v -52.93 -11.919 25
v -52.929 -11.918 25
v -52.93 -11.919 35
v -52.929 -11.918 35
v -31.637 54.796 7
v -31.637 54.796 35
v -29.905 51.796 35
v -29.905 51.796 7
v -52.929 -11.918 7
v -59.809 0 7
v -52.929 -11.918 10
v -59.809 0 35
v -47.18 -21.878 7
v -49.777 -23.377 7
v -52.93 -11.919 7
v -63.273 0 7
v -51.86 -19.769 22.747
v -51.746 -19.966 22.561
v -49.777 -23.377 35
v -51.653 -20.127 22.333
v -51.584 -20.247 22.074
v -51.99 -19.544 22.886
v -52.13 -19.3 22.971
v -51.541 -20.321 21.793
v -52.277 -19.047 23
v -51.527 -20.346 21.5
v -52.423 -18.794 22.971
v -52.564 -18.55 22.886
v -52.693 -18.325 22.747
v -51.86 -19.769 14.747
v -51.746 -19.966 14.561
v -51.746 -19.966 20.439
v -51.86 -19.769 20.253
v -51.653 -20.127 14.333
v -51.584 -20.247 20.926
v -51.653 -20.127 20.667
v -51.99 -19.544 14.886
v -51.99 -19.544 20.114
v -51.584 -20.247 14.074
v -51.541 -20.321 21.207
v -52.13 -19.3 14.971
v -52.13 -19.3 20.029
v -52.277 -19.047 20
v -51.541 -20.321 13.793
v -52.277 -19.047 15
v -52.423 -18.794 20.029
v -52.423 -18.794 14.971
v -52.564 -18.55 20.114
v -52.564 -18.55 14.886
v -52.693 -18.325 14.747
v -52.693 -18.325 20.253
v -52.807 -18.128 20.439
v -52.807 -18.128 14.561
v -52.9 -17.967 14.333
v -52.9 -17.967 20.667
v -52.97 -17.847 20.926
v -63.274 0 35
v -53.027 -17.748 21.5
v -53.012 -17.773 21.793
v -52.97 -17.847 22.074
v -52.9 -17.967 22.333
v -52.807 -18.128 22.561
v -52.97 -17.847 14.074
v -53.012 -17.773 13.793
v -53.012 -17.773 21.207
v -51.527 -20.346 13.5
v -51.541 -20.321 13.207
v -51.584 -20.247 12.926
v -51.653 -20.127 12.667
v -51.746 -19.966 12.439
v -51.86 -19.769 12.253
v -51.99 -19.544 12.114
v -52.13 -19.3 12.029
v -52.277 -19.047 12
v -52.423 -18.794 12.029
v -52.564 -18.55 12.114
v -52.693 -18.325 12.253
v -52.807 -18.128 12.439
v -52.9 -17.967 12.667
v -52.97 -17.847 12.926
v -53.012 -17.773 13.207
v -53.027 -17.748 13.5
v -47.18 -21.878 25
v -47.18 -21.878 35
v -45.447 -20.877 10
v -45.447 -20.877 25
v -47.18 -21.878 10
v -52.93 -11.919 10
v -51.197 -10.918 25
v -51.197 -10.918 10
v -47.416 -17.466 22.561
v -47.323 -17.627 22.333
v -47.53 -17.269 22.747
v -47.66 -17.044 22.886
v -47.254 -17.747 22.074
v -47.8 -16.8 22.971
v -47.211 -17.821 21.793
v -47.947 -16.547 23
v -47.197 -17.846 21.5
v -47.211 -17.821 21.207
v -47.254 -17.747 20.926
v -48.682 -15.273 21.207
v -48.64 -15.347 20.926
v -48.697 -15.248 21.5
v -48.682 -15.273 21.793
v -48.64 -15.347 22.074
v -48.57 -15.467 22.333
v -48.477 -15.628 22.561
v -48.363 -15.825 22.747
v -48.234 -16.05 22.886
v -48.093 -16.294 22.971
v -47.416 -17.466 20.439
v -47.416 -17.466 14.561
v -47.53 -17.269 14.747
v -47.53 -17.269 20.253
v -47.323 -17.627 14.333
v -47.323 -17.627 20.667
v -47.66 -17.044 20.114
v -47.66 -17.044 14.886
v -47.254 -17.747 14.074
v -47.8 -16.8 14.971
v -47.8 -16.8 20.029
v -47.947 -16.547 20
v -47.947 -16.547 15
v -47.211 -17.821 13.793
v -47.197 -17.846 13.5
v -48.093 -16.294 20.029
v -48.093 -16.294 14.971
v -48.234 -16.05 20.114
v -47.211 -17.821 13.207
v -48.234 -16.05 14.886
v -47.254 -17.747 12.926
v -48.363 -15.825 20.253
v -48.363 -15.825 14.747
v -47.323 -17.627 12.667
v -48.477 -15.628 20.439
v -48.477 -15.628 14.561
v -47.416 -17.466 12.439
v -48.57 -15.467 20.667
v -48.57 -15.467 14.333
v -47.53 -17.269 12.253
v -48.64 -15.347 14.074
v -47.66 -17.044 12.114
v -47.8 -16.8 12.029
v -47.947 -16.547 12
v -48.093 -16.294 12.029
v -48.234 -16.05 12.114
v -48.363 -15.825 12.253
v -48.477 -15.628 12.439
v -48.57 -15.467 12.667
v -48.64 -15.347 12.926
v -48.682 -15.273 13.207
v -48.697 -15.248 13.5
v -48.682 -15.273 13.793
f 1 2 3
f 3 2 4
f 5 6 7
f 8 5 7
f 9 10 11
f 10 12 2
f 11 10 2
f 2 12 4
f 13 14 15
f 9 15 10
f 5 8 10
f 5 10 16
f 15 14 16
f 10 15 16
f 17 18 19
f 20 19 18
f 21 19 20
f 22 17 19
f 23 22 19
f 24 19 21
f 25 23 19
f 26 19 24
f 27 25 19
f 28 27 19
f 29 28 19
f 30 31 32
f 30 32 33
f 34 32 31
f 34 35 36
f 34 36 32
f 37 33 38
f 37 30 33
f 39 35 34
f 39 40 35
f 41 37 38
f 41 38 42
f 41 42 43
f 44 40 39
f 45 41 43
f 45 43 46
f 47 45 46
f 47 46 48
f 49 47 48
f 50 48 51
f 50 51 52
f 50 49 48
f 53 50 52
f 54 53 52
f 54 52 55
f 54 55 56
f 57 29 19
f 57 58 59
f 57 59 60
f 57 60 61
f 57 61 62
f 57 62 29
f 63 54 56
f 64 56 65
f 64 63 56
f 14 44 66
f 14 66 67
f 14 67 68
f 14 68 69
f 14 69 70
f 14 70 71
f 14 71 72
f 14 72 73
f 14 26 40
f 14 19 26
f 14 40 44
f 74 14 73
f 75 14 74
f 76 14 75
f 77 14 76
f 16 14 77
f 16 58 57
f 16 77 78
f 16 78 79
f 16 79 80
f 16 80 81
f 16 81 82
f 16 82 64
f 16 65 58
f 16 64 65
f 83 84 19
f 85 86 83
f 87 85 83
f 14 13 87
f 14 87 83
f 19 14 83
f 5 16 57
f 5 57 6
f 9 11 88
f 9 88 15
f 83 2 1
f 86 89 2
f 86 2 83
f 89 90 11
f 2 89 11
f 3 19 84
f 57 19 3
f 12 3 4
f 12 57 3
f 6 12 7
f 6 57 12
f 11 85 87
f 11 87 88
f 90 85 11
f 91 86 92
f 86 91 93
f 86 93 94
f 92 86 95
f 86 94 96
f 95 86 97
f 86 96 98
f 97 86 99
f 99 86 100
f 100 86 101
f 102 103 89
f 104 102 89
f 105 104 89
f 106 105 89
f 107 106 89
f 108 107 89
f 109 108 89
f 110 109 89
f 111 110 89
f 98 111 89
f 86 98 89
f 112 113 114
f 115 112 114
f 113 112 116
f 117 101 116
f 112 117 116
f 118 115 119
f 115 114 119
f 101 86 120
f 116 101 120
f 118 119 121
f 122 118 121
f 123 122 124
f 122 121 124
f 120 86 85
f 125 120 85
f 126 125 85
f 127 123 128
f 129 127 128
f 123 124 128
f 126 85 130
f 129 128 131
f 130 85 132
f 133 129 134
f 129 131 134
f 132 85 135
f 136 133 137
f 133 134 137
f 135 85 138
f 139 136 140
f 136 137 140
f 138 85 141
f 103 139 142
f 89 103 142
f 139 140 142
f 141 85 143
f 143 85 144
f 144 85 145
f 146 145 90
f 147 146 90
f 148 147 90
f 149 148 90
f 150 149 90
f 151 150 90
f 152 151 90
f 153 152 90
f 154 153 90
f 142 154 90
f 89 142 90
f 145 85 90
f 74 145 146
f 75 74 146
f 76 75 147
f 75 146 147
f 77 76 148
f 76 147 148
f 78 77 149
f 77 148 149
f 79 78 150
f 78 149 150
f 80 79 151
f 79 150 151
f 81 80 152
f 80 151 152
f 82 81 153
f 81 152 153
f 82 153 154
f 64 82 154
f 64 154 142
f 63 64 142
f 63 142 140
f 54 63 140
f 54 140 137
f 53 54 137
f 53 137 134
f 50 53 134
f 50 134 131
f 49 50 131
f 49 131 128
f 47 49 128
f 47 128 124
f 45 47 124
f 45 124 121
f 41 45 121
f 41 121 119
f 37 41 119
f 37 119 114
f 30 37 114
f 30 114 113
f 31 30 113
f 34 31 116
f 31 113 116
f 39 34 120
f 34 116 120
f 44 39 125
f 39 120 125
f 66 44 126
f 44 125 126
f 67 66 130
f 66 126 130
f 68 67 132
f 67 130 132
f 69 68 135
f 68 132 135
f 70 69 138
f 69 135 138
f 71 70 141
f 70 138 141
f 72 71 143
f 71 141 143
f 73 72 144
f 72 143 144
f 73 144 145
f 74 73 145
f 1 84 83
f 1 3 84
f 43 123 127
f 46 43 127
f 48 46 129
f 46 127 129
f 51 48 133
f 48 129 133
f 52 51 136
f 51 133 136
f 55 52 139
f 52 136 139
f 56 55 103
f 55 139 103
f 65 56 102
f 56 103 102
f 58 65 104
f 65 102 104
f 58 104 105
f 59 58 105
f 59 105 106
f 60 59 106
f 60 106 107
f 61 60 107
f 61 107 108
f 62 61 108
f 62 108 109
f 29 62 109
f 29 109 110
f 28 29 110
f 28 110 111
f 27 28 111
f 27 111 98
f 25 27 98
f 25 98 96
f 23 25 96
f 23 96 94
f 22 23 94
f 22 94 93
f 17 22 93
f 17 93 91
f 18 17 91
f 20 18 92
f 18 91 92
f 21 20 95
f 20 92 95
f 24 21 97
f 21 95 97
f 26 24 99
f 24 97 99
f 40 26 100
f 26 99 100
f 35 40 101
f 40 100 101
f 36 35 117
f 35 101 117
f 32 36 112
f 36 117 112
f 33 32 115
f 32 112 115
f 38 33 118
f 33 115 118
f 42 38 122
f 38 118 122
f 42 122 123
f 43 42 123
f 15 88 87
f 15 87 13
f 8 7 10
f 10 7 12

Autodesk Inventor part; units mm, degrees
ref_plane "YZ Plane" through (0, 0, 0) normal (1, 0, 0) x (0, 1, 0)
ref_plane "XZ Plane" through (0, 0, 0) normal (0, 1, 0) x (-1, 0, 0)
ref_plane "XY Plane" through (0, 0, 0) normal (0, 0, 1) x (1, 0, 0)
sketch "Sketch1" plane through (0, 0, 0) normal (0, 0, 1) x (1, 0, 0)
  line L0 (57.5, 0) -> (28.75, -49.7965) construction
  line L1 (28.75, -49.7965) -> (-28.75, -49.7965) construction
  line L2 (-28.75, -49.7965) -> (-57.5, 0) construction
  line L3 (-57.5, 0) -> (-28.75, 49.7965) construction
  line L4 (-28.75, 49.7965) -> (28.75, 49.7965) construction
  line L5 (28.75, 49.7965) -> (57.5, 0) construction
  line L6 (-31.6368, 54.7965) -> (-63.2735, 0) construction
  line L7 (-63.2735, 0) -> (-31.6368, -54.7965) construction
  line L8 (-31.6368, -54.7965) -> (31.6368, -54.7965) construction
  line L9 (31.6368, -54.7965) -> (63.2735, 0) construction
  line L10 (63.2735, 0) -> (31.6368, 54.7965) construction
  line L11 (31.6368, 54.7965) -> (-31.6368, 54.7965) construction
  line L12 (-47.9466, -16.547) -> (-52.2767, -19.047) construction
  line L13 (-45.4466, -20.8771) -> (-49.7767, -23.3771)
  line L14 (-45.4466, -20.8771) -> (-57.5, 0)
  line L15 (-49.7767, -23.3771) -> (-63.2735, 0)
  line L16 (-63.2735, 0) -> (-31.6368, 54.7965)
  line L17 (-31.6368, 54.7965) -> (-28.75, 49.7965)
  line L18 (-28.75, 49.7965) -> (-57.5, 0)
  point P0 (0, 0)
  point P1 (0, 0)
  dimension "d0" = 115
  dimension "d1" = 5
  dimension "d2" = 19.1068
  dimension "d3" = 5
extrude "Extrusion1" add sketch "Sketch1" along normal blind 35
sketch "Sketch2" plane through (-57.5, 0, 35) normal (0.8660254, 0.5, 0) x (0, 0, -1)
  circle A0 centre (17.5, -19.1068) radius 1.5 construction
  line L0 (35, -24.1068) -> (0, -24.1068) projected
  line L1 (21.5, -19.1068) -> (13.5, -19.1068) construction
  circle A1 centre (21.5, -19.1068) radius 1.5
  circle A2 centre (13.5, -19.1068) radius 1.5
  point P0 (35, -28.75)
  point P1 (17.5, -24.1068)
  dimension "d6" = 3
  dimension "d7" = 5
  dimension "d14" = 8
  dimension "d15" = 3
  dimension "d16" = 3
extrude "Extrusion2" cut sketch "Sketch2" against normal through all
sketch "Sketch3" plane through (0, 0, 35) normal (0, 0, 1) x (1, 0, 0)
  line L0 (-45.4466, -20.8771) -> (-57.5, 0) construction
  line L1 (-57.5, 0) -> (-28.75, 49.7965) construction
  line L2 (-30.4821, 50.7965) -> (-59.8094, 0) construction
  line L3 (-59.8094, 0) -> (-47.1786, -21.8771) construction
  line L4 (-51.5267, -20.346) -> (-53.0267, -17.7479) construction
  line L5 (-48.6966, -15.2479) -> (-47.1966, -17.846) construction
  line L6 (-51.1966, -10.9178) -> (-52.9286, -11.9178)
  line L7 (-51.1966, -10.9178) -> (-57.5, 0)
  line L8 (-57.5, 0) -> (-28.75, 49.7965)
  line L9 (-28.75, 49.7965) -> (-29.9047, 51.7965)
  line L10 (-28.75, 49.7965) -> (-31.6368, 54.7965) projected
  line L11 (-29.9047, 51.7965) -> (-59.8094, 0)
  line L12 (-59.8094, 0) -> (-52.9286, -11.9178)
  line L13 (-49.7767, -23.3771) -> (-45.4466, -20.8771) projected
  point P0 (0, 0)
  dimension "d10" = 2
  dimension "d17" = 11.5
extrude "Extrusion3" cut sketch "Sketch3" against normal through all
sketch "Sketch4" plane through (-45.4466, -20.8771, 35) normal (0.8660254, 0.5, 0) x (0, 0, -1)
  line L0 (35, 0) -> (0, 0) construction
  line L1 (35, 11.5) -> (0, 11.5) construction
  line L2 (10, 0) -> (25, 0)
  line L3 (25, 0) -> (25, 11.5)
  line L4 (25, 11.5) -> (10, 11.5)
  line L5 (10, 11.5) -> (10, 0)
  circle A0 centre (13.5, 5) radius 1.5 construction
  line L6 (13.5, 5) -> (21.5, 5) construction
  circle A1 centre (21.5, 5) radius 1.5 construction
  line L7 (10, 11.5) -> (0, 11.5)
  line L8 (0, 11.5) -> (0, 0)
  line L9 (0, 0) -> (10, 0)
  line L10 (10, 0) -> (10, 11.5)
  line L11 (35, 11.5) -> (35, 0) projected
  line L12 (25, 11.5) -> (35, 11.5)
  line L13 (35, 11.5) -> (35, 0)
  line L14 (35, 0) -> (25, 0)
  line L15 (25, 0) -> (25, 11.5)
  point P0 (35, -4.6432)
  point P1 (17.5, 5)
  point P2 (17.5, 11.5)
  point P3 (17.5, 11.5)
  dimension "d18" = 15
extrude "Extrusion4" cut sketch "Sketch4" against normal blind 2 contours L9 L8 L7 L5 | L3 L12 L11 L14
sketch "Sketch5" plane through (-49.7767, -23.3771, 0) normal (-0.8660254, -0.5, 0) x (0, 0, 1)
  line L0 (0, 0) -> (35, 0) projected
  line L1 (0, 58.6303) -> (35, 58.6303) projected
  line L2 (35, 0) -> (28, 0)
  line L3 (28, 0) -> (28, 58.6303)
  line L4 (28, 58.6303) -> (35, 58.6303)
  line L5 (35, 58.6303) -> (35, 0)
  line L6 (0, 0) -> (7, 0)
  line L7 (7, 0) -> (7, 58.6303)
  line L8 (7, 58.6303) -> (0, 58.6303)
  line L9 (0, 58.6303) -> (0, 0)
  point P0 (0, -4.6432)
  dimension "d21" = 7
  dimension "d24" = 7
extrude "Extrusion5" cut sketch "Sketch5" against normal through all contours L9 L1 L7 L0
properties part number "TA09" material "ABS Plastic"
